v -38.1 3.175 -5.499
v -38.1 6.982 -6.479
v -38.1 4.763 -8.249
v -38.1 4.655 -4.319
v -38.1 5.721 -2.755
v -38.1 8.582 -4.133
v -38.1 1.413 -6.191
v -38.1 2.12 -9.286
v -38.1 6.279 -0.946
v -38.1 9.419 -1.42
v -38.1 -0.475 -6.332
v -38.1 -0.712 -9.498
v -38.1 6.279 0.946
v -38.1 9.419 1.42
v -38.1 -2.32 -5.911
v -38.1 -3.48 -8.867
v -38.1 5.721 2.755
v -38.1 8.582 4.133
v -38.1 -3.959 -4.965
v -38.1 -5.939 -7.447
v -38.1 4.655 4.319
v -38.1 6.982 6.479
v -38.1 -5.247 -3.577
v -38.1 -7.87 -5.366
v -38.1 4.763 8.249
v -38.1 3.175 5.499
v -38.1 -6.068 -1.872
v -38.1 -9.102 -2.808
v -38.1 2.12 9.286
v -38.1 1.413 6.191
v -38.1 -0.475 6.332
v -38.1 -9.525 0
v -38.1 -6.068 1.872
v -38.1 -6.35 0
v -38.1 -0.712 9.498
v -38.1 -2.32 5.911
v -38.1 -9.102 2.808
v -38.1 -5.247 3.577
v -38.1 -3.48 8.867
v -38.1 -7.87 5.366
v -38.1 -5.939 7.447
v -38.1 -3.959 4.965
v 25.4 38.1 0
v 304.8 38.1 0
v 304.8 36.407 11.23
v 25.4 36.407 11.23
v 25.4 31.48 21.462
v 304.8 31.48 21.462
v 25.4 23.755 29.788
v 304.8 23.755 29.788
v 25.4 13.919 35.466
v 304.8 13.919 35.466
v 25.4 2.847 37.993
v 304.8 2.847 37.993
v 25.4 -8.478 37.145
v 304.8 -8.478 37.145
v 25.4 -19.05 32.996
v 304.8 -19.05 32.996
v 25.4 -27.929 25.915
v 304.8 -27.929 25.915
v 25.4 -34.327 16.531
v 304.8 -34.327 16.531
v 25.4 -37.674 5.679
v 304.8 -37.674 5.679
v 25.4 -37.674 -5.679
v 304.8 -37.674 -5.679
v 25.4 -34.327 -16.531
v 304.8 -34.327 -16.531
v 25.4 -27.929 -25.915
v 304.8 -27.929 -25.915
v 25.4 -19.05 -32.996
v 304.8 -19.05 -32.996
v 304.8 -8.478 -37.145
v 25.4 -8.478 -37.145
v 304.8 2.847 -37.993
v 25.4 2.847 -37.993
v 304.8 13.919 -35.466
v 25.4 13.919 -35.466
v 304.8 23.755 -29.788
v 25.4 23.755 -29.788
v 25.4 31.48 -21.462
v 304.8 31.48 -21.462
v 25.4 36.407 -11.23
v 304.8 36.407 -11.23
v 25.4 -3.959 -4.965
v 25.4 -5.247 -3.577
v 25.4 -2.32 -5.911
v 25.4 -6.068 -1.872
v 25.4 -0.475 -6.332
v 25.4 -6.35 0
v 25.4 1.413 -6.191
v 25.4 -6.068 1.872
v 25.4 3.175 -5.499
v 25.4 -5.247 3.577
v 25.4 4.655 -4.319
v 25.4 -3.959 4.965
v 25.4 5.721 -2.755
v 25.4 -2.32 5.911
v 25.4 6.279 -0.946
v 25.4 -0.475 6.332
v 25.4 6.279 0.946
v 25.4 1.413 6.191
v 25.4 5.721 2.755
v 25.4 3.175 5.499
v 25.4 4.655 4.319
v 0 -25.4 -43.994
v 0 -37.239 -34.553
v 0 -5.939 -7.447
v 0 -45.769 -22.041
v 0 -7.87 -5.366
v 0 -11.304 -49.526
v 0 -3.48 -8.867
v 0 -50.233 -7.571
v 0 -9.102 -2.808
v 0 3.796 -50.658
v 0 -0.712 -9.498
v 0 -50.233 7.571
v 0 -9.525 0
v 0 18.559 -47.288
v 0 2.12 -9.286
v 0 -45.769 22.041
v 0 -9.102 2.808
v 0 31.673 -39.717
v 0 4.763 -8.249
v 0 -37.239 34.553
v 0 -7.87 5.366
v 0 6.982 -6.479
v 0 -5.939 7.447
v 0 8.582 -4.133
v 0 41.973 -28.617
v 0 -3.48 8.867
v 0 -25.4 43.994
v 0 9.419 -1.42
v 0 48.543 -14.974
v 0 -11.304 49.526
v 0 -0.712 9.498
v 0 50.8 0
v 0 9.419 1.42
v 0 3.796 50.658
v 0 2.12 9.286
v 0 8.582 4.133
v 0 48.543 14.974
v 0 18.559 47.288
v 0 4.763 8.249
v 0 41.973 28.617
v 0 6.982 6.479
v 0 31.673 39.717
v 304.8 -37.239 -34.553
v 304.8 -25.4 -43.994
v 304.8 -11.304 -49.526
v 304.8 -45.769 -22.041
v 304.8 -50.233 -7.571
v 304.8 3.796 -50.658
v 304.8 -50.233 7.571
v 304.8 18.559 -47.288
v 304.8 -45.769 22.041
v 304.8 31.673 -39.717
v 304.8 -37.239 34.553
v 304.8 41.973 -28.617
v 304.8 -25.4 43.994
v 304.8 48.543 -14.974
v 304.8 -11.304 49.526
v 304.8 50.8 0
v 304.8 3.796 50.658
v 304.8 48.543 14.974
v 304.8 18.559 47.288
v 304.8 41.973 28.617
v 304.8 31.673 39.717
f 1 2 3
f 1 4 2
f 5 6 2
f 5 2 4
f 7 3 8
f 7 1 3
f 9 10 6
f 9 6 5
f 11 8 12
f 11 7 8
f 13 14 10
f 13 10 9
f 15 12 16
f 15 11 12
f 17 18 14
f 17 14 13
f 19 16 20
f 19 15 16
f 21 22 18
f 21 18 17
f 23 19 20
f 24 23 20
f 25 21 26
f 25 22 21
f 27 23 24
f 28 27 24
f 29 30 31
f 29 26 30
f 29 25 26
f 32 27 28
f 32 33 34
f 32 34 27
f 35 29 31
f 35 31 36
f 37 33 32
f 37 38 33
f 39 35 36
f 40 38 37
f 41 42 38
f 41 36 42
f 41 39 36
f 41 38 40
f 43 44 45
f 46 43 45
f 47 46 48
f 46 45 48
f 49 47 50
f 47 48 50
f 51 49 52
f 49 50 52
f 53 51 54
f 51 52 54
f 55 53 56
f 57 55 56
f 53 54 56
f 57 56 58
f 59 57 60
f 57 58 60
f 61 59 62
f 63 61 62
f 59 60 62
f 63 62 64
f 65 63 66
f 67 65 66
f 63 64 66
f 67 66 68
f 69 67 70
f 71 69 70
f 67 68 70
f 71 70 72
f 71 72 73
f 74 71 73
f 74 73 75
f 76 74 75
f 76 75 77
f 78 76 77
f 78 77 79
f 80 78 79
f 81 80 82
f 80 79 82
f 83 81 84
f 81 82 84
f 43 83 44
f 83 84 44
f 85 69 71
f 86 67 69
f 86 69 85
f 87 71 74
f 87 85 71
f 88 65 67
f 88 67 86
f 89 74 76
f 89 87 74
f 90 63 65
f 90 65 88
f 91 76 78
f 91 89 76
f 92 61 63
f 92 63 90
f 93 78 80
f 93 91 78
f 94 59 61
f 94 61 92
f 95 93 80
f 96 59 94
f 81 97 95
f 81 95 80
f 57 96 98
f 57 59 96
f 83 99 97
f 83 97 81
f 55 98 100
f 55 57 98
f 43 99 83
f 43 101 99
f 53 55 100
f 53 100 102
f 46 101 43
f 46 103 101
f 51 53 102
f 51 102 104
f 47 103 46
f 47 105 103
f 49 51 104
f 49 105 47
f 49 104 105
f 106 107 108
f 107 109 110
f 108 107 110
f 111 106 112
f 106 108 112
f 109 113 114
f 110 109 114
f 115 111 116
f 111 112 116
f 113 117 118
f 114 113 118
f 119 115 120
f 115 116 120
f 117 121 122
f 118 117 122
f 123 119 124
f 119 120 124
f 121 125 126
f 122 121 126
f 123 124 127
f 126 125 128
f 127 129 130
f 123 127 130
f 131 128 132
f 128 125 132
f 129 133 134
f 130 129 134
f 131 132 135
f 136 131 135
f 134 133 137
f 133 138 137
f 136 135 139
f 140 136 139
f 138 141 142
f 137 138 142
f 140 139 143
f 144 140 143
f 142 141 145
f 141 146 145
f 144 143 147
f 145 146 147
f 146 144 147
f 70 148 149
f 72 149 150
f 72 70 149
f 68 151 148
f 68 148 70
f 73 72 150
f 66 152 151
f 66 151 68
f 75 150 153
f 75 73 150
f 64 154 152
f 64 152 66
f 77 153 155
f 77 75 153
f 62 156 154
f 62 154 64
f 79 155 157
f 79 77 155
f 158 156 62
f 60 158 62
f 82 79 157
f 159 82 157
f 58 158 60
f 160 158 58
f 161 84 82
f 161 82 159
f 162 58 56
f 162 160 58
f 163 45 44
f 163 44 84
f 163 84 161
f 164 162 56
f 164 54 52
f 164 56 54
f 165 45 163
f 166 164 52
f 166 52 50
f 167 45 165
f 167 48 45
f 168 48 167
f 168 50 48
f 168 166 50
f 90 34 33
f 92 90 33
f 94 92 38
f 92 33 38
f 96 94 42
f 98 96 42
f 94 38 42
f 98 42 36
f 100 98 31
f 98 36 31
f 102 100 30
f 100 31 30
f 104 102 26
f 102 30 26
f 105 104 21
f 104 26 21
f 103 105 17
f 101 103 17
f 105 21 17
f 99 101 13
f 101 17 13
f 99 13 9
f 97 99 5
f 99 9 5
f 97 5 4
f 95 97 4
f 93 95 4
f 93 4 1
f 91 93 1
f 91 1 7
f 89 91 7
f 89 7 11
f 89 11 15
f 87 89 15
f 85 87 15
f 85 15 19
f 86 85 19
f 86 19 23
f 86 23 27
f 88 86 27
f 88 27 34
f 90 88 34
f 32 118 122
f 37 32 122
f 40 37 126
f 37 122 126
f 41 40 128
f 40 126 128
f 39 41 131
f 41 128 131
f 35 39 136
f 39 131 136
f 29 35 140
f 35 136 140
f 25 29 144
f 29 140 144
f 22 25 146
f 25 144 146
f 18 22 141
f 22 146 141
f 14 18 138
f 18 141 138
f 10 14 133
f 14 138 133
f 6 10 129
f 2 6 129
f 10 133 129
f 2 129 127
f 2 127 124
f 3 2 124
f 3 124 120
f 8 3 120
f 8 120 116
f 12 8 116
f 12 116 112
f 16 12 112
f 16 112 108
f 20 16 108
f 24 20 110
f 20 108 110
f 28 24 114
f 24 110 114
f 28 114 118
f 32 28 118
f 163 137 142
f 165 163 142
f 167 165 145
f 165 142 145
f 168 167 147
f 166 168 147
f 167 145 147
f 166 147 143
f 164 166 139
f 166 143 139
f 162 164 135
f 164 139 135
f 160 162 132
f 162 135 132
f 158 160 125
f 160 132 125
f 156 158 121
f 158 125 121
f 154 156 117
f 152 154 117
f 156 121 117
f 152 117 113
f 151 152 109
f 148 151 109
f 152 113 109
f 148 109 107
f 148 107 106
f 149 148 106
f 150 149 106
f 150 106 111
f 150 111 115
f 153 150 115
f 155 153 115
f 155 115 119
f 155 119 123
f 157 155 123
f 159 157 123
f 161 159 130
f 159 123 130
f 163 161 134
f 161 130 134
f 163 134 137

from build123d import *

# Parameters (mm, degrees)
F0_R     = 50.8
F1_DEPTH = 304.8
F2_R     = 38.1
F3_DEPTH = 279.4
F4_R     = 9.525
F5_DEPTH = 38.1
F6_R     = 6.35
F7_DEPTH = 91.948


with BuildPart() as f1:
    # F0 (on Right) → F1 (new body)
    with BuildSketch(Plane.YZ):
        Circle(F0_R)
    extrude(amount=F1_DEPTH)

    # F2 (on face) → F3 (cut)
    with BuildSketch(Plane.YZ.offset(304.8)):
        Circle(F2_R)
    extrude(amount=-F3_DEPTH, mode=Mode.SUBTRACT)

    # F4 (on face) → F5 (join)
    with BuildSketch(Plane(origin=(0, 0, 0), x_dir=(0, -1, 0), z_dir=(-1, 0, 0))):
        Circle(F4_R)
    extrude(amount=F5_DEPTH)

    # F6 (on face) → F7 (cut)
    with BuildSketch(Plane(origin=(-38.1, 0, 0), x_dir=(0, -1, 0), z_dir=(-1, 0, 0))):
        Circle(F6_R)
    extrude(amount=-F7_DEPTH, mode=Mode.SUBTRACT)


solid = f1.part
